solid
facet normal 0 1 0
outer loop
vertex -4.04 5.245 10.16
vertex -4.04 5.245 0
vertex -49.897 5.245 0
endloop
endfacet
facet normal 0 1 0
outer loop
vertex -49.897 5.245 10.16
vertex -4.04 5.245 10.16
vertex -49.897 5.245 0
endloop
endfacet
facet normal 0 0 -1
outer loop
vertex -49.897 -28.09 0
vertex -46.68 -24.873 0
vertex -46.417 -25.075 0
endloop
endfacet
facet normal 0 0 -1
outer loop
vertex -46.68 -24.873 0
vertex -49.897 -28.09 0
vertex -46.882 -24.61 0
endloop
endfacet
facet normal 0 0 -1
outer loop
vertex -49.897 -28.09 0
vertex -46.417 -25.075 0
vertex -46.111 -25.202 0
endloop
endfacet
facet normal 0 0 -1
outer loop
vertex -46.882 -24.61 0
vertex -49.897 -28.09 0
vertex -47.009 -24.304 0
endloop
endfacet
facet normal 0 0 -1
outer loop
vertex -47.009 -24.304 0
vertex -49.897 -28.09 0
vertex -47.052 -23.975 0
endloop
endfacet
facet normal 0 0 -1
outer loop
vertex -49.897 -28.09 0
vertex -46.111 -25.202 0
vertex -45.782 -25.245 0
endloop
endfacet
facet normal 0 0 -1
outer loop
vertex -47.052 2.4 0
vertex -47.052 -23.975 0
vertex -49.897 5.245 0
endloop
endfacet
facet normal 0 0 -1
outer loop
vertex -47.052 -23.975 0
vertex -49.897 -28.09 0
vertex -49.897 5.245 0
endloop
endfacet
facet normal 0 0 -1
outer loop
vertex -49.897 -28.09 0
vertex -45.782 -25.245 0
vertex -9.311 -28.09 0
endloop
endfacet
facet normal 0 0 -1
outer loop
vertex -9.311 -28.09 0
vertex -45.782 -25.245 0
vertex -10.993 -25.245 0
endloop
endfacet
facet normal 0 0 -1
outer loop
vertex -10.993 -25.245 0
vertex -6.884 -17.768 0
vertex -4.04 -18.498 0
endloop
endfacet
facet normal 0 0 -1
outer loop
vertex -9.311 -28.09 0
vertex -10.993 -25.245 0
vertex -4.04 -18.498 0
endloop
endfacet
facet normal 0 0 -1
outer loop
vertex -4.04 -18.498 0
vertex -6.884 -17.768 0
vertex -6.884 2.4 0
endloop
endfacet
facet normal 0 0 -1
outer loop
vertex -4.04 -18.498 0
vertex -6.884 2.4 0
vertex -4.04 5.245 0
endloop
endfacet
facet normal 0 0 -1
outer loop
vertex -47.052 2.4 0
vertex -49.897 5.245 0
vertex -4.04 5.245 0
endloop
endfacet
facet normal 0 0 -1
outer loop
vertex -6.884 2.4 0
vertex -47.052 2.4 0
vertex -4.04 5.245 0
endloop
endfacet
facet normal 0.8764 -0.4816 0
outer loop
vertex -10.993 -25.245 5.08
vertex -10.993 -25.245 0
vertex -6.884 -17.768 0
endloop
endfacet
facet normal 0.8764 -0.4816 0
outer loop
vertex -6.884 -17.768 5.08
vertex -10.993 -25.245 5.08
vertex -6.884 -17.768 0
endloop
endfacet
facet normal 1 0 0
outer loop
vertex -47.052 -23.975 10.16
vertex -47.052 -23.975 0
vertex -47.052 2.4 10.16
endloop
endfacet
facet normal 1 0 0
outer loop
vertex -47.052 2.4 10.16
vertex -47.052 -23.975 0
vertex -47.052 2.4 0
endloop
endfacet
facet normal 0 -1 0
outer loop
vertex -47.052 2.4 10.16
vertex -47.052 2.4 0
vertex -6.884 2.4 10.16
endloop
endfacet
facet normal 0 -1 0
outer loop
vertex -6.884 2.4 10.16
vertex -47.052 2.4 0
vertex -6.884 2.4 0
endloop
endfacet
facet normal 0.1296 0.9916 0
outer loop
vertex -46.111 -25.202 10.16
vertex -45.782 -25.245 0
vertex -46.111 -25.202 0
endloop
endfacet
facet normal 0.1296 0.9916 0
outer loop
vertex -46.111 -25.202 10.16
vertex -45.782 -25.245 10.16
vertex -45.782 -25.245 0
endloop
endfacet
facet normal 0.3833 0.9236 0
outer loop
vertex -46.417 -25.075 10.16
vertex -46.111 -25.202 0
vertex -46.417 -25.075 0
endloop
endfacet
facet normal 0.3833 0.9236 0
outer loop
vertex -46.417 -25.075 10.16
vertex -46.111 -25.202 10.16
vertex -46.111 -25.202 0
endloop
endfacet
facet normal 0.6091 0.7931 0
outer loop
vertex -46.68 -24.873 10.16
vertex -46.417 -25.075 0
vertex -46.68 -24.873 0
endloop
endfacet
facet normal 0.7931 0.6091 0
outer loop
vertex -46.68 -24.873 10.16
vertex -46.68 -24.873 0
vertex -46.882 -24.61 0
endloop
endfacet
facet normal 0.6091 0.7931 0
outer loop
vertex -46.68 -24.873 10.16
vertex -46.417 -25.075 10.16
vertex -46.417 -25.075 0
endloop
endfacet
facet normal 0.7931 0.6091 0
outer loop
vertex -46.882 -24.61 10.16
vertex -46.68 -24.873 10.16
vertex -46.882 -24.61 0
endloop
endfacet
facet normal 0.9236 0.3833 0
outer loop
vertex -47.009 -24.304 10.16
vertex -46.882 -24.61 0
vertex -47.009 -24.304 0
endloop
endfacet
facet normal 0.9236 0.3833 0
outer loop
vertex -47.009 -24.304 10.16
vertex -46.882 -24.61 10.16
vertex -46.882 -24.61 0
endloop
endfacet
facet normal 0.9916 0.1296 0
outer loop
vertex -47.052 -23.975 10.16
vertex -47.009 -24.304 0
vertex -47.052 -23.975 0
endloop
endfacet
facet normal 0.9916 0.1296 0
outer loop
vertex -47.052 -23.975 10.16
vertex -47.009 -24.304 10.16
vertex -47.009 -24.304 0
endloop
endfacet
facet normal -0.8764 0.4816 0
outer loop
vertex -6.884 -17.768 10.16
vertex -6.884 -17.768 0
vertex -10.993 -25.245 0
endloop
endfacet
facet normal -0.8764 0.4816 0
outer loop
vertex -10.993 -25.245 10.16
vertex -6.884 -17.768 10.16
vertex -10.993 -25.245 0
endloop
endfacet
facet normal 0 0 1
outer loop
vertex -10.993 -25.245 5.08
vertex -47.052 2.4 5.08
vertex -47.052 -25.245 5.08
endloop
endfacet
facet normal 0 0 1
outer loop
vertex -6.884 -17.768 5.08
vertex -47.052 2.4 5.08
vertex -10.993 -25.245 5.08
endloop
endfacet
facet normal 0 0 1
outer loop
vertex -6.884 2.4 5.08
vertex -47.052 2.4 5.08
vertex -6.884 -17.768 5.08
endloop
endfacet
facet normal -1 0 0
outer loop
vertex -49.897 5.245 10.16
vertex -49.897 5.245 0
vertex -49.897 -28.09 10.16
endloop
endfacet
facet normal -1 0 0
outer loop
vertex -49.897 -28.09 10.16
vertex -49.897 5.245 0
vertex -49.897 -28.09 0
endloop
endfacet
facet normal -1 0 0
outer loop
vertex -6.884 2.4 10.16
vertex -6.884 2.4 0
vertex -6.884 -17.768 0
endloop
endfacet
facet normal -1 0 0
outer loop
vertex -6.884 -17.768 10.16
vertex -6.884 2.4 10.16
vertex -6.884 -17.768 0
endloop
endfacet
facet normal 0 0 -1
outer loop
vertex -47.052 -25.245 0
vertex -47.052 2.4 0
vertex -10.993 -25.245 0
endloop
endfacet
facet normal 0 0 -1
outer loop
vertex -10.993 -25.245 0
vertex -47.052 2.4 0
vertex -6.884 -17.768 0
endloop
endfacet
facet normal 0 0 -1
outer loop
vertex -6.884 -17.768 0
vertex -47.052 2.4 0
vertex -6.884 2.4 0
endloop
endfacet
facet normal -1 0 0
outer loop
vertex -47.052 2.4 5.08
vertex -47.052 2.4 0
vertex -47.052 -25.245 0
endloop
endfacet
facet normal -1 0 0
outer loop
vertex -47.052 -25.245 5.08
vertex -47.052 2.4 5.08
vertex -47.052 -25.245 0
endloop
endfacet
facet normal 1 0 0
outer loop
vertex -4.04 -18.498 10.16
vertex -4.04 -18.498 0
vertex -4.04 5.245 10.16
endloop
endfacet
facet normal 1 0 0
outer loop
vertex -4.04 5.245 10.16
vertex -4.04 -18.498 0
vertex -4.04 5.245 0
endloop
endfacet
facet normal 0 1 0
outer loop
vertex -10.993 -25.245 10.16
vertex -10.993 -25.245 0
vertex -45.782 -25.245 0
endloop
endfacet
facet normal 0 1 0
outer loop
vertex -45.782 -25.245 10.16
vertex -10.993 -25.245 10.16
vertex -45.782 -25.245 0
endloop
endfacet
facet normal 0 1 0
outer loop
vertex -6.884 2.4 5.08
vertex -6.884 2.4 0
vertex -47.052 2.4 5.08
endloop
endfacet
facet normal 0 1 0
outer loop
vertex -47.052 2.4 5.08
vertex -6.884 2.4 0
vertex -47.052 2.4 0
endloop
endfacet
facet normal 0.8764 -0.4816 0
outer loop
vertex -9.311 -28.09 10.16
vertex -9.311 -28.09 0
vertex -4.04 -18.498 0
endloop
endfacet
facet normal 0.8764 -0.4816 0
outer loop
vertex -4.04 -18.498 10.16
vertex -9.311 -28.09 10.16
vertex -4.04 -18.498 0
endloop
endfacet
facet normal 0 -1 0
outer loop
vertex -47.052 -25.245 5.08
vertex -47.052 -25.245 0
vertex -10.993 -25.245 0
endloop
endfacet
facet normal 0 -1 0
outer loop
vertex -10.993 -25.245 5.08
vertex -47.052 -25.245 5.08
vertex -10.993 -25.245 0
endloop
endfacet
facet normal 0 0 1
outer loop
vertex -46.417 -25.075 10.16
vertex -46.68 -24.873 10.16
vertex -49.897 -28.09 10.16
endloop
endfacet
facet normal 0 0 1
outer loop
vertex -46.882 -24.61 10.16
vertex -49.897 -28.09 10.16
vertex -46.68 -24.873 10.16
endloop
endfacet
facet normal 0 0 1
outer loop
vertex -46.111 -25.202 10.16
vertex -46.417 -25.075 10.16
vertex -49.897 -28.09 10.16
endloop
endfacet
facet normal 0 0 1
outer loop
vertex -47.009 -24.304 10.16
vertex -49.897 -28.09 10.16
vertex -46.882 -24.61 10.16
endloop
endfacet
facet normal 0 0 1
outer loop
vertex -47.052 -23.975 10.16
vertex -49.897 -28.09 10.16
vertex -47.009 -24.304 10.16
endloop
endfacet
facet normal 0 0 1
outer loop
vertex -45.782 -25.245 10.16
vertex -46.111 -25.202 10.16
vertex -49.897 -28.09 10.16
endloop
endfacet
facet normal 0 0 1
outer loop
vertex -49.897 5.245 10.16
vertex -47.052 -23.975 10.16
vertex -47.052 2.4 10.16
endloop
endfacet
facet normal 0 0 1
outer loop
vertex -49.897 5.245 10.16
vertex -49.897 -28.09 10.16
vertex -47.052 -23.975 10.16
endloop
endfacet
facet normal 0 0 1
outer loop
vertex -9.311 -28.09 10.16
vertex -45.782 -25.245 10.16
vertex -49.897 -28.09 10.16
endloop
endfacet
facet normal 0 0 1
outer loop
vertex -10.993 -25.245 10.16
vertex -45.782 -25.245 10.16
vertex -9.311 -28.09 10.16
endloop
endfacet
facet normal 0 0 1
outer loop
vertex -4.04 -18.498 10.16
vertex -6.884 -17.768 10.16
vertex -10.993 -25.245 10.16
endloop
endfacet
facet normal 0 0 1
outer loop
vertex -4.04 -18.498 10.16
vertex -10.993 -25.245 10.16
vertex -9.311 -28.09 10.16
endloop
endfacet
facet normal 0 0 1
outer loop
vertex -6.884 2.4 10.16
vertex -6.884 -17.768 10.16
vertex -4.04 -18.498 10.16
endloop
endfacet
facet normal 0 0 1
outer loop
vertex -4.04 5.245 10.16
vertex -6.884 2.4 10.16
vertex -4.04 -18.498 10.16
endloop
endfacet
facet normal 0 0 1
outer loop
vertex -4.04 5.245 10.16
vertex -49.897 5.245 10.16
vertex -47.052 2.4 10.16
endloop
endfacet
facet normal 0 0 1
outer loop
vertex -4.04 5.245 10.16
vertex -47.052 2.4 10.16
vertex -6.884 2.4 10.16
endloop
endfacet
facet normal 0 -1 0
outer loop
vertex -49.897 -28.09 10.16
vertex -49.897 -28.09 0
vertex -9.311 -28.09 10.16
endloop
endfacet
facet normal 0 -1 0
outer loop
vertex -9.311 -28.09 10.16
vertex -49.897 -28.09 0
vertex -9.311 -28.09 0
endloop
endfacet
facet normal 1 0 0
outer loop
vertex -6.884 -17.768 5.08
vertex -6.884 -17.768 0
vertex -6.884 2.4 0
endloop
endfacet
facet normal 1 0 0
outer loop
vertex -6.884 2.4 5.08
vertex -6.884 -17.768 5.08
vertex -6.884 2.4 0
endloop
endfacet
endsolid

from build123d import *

# Parameters (mm, degrees)
F1_DEPTH = 10.16
F3_DEPTH = 5.08
F4_R     = 1.27


with BuildPart() as f1:
    # F0 (on Top) → F1 (new body)
    with BuildSketch(Plane.XY):
        Polygon((-9.3105762227, -28.0902255327), (-4.0396083556, -18.4977187932), (-4.0396083556, 5.2447912779), (-49.8968251661, 5.2447912779), (-49.8968251661, -28.0902255327), align=None)
        Polygon((-47.0520251661, -25.2454255327), (-47.0520251661, 2.3999912779), (-6.8844083556, 2.3999912779), (-6.8844083556, -17.7676087221), (-10.9933793675, -25.2454255327), align=None, mode=Mode.SUBTRACT)
    extrude(amount=F1_DEPTH)

    # F4
    f4_edges = [f1.edges().sort_by_distance(p)[0] for p in [
        (-47.052025, -25.245426, 5.08),
    ]]
    fillet(f4_edges, radius=F4_R)


with BuildPart() as f3:
    # F2 (on face) → F3 (new body)
    with BuildSketch(Plane.XY):
        Polygon((-6.8844083556, -17.7676087221), (-6.8844083556, 2.3999912779), (-47.0520251661, 2.3999912779), (-47.0520251661, -25.2454255327), (-10.9933793675, -25.2454255327), align=None)
    extrude(amount=F3_DEPTH)


solid = Compound([f1.part, f3.part])
